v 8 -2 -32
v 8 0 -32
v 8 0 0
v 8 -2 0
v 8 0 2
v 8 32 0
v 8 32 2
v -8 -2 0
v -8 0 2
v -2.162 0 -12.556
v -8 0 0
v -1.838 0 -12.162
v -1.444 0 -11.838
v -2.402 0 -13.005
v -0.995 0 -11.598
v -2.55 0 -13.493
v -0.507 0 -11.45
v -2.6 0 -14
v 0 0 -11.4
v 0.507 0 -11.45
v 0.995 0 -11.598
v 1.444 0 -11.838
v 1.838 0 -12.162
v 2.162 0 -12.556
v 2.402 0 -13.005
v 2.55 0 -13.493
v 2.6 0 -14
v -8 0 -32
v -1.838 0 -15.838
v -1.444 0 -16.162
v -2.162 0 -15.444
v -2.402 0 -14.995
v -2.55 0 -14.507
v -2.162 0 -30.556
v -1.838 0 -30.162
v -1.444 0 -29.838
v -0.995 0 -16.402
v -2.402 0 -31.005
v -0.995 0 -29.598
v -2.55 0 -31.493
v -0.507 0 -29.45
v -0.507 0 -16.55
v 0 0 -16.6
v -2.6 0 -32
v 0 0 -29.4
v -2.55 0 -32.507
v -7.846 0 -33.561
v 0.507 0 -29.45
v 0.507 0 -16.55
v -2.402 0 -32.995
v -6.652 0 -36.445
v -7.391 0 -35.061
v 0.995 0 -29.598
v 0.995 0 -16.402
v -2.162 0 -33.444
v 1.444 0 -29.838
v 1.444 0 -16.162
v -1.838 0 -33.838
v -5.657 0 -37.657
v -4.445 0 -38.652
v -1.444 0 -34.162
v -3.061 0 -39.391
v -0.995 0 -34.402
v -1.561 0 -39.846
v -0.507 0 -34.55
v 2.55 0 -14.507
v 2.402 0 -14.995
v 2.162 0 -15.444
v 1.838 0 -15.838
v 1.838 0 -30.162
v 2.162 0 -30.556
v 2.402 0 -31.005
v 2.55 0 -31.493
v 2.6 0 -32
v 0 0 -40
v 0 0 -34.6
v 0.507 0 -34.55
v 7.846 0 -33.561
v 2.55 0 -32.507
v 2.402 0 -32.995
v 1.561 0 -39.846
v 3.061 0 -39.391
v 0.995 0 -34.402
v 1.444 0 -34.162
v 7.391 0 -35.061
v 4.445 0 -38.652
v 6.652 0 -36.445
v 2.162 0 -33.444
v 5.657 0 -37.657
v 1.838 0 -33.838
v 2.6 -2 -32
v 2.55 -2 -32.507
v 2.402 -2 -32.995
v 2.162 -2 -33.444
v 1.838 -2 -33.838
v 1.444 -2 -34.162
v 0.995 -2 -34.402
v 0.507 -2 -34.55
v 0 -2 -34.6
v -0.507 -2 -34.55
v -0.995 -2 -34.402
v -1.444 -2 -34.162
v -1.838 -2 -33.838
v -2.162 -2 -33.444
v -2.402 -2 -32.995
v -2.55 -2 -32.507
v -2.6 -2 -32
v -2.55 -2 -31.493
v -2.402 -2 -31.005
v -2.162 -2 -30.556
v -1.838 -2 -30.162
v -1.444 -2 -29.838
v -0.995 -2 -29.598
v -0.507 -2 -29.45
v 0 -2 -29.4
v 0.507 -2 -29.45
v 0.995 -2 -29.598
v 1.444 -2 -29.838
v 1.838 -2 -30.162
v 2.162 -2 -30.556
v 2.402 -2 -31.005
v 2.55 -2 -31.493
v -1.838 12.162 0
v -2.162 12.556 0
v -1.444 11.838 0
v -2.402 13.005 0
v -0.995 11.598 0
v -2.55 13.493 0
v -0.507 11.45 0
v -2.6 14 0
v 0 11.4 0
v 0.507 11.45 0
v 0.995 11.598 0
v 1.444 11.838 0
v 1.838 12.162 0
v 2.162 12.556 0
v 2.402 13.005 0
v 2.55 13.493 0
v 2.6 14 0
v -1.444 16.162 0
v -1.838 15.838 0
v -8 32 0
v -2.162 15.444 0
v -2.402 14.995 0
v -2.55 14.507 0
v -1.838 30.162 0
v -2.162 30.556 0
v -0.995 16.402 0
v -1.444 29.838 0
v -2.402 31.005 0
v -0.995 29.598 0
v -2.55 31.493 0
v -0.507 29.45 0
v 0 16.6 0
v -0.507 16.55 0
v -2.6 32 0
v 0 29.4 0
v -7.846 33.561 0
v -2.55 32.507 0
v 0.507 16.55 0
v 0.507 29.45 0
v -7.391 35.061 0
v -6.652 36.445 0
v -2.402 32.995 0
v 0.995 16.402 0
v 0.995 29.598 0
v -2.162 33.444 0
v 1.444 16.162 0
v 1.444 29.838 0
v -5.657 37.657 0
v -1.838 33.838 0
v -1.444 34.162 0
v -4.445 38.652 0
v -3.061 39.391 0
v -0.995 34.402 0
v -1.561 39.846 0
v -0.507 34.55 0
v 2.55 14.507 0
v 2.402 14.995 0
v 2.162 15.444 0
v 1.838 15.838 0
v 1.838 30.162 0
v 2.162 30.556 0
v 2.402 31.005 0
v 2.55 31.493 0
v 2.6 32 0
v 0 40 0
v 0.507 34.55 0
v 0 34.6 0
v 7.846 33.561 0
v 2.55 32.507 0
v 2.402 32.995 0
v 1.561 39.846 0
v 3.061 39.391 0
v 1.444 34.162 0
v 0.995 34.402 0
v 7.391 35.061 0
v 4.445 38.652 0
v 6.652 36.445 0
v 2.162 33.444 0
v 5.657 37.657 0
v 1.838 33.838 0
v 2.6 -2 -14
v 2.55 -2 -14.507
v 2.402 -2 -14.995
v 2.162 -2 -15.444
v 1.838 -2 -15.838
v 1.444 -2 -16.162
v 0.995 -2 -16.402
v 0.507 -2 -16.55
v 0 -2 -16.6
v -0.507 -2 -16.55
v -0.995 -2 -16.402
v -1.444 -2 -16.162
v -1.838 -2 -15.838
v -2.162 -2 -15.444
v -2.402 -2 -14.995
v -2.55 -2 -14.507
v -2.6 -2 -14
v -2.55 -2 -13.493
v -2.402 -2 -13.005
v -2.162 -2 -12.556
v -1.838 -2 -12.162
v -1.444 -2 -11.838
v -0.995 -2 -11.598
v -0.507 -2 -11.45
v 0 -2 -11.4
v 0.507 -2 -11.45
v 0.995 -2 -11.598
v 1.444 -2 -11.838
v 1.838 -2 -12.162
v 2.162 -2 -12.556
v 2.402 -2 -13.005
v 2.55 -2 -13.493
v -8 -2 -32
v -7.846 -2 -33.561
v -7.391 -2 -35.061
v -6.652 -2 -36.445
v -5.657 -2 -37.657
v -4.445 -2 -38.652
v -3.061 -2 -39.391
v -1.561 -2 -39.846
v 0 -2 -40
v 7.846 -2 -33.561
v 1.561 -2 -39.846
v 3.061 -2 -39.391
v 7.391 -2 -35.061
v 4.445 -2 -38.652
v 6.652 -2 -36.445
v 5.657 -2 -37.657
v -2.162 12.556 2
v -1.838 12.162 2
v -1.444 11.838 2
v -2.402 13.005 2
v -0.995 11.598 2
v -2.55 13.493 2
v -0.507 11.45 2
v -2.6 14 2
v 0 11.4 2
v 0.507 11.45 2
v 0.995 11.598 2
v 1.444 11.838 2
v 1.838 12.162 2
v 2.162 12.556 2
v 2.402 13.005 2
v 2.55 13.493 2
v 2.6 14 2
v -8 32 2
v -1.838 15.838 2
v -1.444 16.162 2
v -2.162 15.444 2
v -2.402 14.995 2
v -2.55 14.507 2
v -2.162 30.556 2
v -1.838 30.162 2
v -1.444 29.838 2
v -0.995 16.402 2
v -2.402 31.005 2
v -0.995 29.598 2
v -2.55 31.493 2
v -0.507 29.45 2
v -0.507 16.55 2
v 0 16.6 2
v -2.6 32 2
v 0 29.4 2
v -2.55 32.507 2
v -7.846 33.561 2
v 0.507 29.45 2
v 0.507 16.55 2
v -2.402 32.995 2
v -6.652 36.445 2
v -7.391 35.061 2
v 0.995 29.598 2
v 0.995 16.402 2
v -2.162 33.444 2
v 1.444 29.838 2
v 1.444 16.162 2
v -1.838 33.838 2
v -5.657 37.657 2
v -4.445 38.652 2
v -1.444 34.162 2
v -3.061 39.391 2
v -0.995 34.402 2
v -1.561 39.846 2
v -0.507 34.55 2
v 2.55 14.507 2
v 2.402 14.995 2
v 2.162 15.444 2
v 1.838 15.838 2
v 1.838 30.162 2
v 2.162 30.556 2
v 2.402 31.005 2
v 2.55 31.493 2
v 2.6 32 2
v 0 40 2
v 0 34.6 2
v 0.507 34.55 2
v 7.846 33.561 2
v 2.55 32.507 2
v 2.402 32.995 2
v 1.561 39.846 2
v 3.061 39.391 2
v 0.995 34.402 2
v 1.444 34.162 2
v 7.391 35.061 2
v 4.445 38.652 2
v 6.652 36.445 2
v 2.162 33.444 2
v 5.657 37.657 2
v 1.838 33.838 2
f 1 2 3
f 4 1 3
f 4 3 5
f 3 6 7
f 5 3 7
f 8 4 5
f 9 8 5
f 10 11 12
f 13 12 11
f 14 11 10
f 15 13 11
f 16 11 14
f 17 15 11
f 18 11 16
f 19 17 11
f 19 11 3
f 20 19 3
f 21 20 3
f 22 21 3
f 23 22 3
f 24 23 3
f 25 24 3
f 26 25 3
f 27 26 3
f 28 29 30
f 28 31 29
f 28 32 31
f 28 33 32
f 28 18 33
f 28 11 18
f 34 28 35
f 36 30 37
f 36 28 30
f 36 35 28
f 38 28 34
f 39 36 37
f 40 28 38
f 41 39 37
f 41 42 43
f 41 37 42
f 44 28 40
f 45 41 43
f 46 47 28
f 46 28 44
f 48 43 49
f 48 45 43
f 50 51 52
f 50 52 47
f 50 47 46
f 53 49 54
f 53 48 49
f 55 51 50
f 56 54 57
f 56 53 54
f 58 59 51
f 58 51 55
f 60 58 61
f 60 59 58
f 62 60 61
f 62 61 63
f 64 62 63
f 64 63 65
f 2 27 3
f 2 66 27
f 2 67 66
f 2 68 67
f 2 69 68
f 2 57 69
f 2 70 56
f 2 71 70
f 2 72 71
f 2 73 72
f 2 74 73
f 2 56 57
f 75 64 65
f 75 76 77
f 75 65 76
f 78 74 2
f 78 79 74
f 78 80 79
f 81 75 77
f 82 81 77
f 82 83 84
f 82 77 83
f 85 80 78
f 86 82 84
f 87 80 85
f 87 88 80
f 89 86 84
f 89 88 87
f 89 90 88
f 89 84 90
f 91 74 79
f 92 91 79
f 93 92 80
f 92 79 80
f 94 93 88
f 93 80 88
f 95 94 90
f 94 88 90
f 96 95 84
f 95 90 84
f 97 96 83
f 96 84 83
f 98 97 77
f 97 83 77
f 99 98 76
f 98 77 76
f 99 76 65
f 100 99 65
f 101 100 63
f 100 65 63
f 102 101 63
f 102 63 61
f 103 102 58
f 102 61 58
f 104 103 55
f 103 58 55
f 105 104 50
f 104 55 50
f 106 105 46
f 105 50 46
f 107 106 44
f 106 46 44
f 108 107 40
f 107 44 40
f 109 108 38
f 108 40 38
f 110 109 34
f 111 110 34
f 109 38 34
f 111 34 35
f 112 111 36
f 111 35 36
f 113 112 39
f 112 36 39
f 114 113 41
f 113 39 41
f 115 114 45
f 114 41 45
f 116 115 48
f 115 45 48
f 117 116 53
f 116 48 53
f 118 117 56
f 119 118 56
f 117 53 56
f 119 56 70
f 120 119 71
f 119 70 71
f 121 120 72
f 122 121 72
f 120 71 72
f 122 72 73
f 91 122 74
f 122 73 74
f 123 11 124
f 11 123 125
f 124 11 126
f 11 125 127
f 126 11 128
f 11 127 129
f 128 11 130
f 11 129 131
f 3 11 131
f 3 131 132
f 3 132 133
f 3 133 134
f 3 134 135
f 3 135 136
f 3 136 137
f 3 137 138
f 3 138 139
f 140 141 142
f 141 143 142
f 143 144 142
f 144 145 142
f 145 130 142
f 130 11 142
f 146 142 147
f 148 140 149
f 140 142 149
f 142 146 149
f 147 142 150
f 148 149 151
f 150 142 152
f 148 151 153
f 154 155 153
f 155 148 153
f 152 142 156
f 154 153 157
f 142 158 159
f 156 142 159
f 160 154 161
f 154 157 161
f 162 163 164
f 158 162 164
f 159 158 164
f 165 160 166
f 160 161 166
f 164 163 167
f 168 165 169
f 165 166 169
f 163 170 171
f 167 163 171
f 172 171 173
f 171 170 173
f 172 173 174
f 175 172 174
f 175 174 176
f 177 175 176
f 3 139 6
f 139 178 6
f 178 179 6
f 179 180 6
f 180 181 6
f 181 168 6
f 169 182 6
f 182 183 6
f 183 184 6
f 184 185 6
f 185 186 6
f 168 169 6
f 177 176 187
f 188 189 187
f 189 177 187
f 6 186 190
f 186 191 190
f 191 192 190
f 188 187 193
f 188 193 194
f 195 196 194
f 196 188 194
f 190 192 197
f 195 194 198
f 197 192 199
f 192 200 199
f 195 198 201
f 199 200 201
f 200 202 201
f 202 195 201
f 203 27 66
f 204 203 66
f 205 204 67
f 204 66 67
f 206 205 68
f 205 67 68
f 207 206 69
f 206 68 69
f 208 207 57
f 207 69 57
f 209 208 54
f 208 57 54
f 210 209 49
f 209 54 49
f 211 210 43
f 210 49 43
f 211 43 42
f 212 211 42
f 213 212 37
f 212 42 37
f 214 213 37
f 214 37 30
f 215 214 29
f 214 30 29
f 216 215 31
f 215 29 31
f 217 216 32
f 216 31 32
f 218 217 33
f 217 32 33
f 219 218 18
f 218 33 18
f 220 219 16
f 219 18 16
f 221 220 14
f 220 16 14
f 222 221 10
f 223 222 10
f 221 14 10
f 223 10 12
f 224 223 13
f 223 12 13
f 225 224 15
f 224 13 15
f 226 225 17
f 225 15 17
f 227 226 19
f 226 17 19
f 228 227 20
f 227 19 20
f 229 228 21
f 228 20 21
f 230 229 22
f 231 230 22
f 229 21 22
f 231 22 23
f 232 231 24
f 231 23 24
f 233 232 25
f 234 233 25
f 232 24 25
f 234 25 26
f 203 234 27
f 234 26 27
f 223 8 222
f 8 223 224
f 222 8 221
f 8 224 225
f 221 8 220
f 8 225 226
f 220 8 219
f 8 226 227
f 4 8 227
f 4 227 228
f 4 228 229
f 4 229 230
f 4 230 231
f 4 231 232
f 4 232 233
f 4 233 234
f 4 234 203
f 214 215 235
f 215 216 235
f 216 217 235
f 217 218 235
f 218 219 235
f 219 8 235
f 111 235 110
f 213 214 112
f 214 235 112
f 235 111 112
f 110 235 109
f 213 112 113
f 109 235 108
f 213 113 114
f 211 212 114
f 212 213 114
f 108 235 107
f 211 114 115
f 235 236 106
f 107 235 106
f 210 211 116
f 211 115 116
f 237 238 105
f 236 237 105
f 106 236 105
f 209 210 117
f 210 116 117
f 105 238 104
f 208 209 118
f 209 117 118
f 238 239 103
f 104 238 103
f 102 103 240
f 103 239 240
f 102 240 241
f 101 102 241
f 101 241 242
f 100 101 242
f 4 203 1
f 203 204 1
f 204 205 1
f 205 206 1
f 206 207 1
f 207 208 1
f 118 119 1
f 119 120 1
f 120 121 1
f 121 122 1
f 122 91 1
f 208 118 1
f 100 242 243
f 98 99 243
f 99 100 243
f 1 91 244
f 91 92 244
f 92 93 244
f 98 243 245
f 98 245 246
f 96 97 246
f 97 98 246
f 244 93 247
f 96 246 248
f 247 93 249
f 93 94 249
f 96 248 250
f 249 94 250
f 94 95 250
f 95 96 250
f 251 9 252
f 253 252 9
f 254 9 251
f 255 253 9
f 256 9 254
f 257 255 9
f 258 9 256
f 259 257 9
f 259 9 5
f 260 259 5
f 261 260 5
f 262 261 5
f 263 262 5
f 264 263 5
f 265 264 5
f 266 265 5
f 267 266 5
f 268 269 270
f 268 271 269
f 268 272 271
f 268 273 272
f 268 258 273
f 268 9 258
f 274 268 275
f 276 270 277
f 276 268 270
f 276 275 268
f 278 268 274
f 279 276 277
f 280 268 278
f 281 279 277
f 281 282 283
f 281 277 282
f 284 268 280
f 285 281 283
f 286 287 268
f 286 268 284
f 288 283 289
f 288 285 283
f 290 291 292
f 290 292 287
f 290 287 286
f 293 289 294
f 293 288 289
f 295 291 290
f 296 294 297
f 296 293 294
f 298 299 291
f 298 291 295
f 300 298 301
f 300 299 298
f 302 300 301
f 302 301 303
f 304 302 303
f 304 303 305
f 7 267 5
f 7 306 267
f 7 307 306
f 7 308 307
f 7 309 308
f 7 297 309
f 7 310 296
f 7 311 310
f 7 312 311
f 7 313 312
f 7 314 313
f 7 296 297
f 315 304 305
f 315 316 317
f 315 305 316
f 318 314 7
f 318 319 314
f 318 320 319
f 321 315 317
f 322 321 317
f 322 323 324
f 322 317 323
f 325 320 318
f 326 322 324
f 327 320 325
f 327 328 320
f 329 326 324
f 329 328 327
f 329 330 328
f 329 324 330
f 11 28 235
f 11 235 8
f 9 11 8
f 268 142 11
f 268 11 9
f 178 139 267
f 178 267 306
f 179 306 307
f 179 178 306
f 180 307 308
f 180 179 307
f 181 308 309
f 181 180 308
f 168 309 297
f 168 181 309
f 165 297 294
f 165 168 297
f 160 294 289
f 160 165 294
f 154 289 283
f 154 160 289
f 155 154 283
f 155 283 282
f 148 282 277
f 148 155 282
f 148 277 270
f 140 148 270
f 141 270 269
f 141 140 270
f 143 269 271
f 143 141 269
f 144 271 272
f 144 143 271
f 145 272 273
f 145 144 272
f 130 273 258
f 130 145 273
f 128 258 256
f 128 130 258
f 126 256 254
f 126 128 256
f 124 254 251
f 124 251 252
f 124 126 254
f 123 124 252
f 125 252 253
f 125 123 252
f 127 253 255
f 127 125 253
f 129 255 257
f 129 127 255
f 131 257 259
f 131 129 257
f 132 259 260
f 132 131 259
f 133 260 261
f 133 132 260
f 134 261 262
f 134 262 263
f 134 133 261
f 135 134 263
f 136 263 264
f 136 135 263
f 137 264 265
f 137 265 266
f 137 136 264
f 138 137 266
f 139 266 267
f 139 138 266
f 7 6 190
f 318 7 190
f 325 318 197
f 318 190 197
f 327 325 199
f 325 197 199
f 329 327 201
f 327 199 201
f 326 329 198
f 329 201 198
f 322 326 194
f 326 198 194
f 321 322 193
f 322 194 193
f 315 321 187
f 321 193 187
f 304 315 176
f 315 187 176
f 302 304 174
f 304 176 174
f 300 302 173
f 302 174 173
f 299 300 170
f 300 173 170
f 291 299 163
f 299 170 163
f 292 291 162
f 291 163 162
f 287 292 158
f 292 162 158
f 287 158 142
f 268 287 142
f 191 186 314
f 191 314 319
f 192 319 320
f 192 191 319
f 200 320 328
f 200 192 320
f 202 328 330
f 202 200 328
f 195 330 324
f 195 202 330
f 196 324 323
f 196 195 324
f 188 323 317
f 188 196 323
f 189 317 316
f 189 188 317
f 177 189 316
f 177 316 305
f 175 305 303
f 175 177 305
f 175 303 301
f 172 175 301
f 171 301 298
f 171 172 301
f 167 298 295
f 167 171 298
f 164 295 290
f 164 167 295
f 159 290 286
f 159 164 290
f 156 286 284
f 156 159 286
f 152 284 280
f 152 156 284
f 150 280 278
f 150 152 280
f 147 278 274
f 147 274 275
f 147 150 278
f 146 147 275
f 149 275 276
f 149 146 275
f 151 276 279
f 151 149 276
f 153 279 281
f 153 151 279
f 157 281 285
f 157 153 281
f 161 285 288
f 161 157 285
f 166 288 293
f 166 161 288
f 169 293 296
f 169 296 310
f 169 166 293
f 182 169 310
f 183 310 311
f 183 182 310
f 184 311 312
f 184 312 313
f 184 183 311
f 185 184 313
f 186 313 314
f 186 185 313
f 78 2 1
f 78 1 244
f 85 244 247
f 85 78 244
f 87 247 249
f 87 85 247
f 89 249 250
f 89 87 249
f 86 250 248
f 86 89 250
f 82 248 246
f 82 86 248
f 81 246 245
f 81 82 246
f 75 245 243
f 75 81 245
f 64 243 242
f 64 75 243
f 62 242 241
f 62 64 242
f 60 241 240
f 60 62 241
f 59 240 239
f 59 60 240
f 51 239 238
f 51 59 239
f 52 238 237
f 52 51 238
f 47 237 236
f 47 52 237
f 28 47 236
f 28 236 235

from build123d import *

# Parameters (mm, degrees)
SKETCH_1_R      = 2.6
EXTRUDE_1_DEPTH = 2
SKETCH_2_R      = 2.6
EXTRUDE_2_DEPTH = 2
EXTRUDE_3_DEPTH = 16


with BuildPart() as part:
    # 草图1 → 凸台-拉伸1 (new body)
    with BuildSketch(Plane.XY):
        with BuildLine():
            Line((-8, 32), (-8, 0))
            Line((-8, 0), (8, 0))
            Line((8, 0), (8, 32))
            ThreePointArc((8, 32), (0, 40), (-8, 32))
        make_face()
        with Locations((0, 32)):
            Circle(SKETCH_1_R, mode=Mode.SUBTRACT)
        with Locations((0, 14)):
            Circle(SKETCH_1_R, mode=Mode.SUBTRACT)
    extrude(amount=EXTRUDE_1_DEPTH)



with BuildPart() as body_2:
    # 草图2 → 凸台-拉伸2 (new body)
    with BuildSketch(Plane(origin=(0, 0, 0), x_dir=(1, 0, 0), z_dir=(0, 1, 0))):
        with BuildLine():
            Line((-8, 32), (-8, 0))
            Line((-8, 0), (8, 0))
            Line((8, 0), (8, 32))
            ThreePointArc((8, 32), (0, 40), (-8, 32))
        make_face()
        with Locations((0, 32)):
            Circle(SKETCH_2_R, mode=Mode.SUBTRACT)
        with Locations((0, 14)):
            Circle(SKETCH_2_R, mode=Mode.SUBTRACT)
    extrude(amount=-EXTRUDE_2_DEPTH)


with BuildPart() as part_1:
    add(part.part)

    add(body_2.part)  # 凸台-拉伸3 merges body 2
    # 草图3 → 凸台-拉伸3 (add)
    with BuildSketch(Plane(origin=(8, 0, 0), x_dir=(0, 0, -1), z_dir=(1, 0, 0))):
        Polygon((0, 0), (0, -2), (-2, 0), align=None)
    extrude(amount=-EXTRUDE_3_DEPTH)


solid = part_1.part
